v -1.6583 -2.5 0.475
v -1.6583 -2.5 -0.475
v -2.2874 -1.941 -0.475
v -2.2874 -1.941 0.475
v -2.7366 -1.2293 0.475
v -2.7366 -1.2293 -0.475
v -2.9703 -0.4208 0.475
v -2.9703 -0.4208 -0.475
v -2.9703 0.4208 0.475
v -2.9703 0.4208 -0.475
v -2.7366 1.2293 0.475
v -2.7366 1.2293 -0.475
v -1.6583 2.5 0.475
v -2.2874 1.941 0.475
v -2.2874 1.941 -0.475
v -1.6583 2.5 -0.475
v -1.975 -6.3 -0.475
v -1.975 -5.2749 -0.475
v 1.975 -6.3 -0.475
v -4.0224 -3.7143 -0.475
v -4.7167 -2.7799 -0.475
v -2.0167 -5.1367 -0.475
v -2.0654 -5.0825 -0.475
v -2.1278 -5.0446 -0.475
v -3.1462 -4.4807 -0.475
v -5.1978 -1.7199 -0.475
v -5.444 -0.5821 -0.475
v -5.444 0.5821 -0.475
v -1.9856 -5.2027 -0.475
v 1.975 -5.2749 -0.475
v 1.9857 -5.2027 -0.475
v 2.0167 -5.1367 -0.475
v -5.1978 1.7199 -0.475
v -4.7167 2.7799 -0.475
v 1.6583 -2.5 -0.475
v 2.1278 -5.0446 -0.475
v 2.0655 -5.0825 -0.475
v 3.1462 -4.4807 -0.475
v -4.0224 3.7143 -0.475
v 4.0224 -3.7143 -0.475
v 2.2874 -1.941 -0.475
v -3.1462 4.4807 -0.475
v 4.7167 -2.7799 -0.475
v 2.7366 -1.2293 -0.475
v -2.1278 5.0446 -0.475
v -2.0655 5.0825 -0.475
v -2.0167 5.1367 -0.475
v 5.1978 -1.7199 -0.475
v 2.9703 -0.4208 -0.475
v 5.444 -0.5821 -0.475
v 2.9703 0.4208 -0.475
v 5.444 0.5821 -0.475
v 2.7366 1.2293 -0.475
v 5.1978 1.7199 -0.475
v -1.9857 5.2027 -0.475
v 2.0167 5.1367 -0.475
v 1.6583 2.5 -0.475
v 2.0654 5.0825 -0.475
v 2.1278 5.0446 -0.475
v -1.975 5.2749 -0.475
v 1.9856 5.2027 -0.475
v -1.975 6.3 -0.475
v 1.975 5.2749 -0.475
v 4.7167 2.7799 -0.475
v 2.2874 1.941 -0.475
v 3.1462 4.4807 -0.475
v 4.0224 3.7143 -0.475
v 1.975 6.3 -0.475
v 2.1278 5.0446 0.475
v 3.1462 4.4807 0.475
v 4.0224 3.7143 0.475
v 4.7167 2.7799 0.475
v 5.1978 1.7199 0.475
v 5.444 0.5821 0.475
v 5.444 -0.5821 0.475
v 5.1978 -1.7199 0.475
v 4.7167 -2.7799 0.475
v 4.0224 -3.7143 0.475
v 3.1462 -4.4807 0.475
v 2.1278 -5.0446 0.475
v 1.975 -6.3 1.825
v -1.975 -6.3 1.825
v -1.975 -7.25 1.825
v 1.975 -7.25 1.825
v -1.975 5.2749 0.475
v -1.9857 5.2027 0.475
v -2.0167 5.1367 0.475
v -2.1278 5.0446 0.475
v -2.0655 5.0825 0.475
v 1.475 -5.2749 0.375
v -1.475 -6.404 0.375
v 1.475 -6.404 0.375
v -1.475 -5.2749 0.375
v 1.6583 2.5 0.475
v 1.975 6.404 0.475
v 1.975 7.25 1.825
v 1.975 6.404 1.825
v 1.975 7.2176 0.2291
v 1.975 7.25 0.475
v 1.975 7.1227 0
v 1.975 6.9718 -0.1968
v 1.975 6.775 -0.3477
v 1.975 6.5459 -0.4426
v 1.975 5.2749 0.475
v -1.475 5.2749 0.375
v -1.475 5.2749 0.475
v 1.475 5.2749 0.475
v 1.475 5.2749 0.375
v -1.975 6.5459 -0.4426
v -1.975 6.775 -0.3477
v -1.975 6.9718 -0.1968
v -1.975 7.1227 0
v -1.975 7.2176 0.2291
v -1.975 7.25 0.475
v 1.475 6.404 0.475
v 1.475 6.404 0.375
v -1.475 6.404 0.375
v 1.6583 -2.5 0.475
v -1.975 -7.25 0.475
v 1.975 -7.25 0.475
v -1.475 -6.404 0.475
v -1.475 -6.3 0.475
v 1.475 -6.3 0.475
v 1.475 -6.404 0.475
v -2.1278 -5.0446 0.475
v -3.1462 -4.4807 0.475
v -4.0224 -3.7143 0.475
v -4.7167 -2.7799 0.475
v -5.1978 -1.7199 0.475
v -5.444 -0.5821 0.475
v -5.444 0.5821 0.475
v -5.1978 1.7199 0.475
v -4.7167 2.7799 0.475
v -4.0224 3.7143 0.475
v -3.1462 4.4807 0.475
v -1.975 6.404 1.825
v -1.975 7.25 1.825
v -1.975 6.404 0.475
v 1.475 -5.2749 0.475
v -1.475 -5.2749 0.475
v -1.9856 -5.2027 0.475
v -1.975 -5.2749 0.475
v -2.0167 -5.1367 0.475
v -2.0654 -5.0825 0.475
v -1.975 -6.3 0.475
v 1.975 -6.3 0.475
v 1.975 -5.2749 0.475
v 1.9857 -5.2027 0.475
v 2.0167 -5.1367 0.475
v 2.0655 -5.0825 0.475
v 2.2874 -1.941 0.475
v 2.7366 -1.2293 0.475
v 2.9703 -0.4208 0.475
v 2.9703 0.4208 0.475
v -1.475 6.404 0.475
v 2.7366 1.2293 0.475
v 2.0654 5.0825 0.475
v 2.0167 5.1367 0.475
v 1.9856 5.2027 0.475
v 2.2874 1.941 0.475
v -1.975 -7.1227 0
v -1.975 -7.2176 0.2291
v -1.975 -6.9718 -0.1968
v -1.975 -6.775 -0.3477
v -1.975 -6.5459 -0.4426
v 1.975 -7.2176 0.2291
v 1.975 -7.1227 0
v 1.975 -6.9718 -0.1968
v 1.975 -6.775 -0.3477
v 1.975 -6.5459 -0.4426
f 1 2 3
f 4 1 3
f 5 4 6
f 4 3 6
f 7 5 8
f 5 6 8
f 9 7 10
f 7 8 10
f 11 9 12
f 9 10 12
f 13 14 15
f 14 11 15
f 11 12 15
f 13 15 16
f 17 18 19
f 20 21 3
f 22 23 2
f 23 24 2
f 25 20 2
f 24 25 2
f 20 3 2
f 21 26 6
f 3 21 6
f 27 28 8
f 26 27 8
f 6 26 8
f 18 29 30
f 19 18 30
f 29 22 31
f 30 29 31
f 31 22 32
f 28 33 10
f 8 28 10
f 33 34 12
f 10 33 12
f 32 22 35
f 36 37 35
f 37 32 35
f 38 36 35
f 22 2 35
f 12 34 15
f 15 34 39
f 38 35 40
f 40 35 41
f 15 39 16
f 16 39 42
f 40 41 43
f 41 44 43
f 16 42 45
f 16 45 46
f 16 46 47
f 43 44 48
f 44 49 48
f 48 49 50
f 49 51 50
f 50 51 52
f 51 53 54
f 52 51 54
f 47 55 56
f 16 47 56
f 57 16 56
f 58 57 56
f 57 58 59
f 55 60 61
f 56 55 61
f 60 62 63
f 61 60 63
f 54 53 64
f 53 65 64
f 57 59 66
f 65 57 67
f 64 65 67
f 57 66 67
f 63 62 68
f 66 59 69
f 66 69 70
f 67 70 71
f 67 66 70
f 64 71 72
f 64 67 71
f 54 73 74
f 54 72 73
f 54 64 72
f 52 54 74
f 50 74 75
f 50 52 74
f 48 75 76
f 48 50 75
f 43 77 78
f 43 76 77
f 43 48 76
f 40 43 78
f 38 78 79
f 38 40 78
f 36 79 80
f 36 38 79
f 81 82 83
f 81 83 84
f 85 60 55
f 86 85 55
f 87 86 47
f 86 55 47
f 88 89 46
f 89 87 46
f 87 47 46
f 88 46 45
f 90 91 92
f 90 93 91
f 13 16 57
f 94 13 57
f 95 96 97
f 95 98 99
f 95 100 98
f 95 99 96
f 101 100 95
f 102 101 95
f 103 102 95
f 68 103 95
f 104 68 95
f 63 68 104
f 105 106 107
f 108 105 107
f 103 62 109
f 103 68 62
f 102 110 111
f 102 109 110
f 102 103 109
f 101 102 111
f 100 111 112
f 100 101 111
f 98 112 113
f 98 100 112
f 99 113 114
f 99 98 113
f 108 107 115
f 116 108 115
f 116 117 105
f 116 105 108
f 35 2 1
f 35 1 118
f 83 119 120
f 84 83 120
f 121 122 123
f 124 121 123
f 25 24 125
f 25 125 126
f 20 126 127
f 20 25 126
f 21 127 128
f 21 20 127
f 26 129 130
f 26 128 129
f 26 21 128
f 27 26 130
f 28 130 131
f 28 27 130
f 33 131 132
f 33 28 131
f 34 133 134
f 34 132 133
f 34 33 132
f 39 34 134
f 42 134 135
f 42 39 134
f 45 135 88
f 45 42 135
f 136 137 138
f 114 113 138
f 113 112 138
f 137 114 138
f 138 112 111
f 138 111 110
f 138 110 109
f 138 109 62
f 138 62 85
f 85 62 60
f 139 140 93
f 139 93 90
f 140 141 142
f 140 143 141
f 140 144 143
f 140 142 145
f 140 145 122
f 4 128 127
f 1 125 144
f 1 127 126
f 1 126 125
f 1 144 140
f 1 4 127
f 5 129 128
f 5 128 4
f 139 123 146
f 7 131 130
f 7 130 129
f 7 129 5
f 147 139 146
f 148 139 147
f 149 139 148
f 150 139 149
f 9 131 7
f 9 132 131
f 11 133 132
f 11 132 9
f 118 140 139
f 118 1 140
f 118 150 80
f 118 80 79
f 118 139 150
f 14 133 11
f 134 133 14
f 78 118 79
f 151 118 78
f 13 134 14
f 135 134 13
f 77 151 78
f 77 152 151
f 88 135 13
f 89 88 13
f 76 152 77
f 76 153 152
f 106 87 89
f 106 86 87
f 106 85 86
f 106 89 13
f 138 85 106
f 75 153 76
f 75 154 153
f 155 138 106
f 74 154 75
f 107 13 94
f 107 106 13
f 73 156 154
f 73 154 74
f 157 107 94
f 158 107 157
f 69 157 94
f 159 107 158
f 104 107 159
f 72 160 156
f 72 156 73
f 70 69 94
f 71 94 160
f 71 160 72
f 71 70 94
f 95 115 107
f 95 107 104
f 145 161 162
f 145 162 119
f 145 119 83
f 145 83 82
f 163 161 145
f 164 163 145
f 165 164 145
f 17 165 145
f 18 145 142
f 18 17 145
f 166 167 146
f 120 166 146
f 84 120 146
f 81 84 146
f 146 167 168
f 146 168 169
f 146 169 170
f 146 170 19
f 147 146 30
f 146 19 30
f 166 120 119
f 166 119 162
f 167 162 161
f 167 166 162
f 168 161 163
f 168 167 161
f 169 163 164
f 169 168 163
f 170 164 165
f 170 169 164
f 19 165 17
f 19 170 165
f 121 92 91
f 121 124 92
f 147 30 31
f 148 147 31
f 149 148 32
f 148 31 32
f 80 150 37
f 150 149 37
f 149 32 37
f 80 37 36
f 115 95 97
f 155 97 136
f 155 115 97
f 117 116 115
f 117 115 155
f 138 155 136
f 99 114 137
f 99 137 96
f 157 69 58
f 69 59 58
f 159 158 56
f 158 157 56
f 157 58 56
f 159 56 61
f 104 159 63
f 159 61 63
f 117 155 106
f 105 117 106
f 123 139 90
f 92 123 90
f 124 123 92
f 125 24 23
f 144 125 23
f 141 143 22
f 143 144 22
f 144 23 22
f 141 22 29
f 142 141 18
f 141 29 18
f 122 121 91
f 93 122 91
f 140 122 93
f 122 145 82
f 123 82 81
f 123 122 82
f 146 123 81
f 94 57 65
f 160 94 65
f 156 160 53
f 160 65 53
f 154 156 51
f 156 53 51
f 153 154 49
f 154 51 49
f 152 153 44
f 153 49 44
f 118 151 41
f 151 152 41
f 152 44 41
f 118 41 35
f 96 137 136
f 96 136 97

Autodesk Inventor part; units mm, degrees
ref_plane "YZ Plane" through (0, 0, 0) normal (1, 0, 0) x (0, 1, 0)
ref_plane "XZ Plane" through (0, 0, 0) normal (0, 1, 0) x (-1, 0, 0)
ref_plane "XY Plane" through (0, 0, 0) normal (0, 0, 1) x (1, 0, 0)
sketch "Szkic4" plane through (0, 0, 0) normal (0, 0, 1) x (1, 0, 0)
  line L0 (-1.6583, 2.5) -> (1.6583, 2.5)
  line L1 (-1.6583, -2.5) -> (1.6583, -2.5)
  arc A0 (-1.6583, 2.5) -> (-1.6583, -2.5) centre (0, 0) ccw
  arc A1 (1.6583, -2.5) -> (1.6583, 2.5) centre (0, 0) ccw
  line L2 (-1.975, 7.25) -> (1.975, 7.25)
  line L3 (-1.975, 7.25) -> (-1.975, 5.2749)
  line L4 (1.975, 7.25) -> (1.975, 5.2749)
  arc A2 (1.975, 5.2749) -> (2.1278, 5.0446) centre (2.225, 5.2749) ccw
  arc A3 (-2.1278, 5.0446) -> (-1.975, 5.2749) centre (-2.225, 5.2749) ccw
  line L5 (-1.975, -7.25) -> (1.975, -7.25)
  line L6 (-1.975, -7.25) -> (-1.975, -5.2749)
  line L7 (1.975, -7.25) -> (1.975, -5.2749)
  arc A4 (2.1278, -5.0446) -> (1.975, -5.2749) centre (2.225, -5.2749) ccw
  arc A5 (-1.975, -5.2749) -> (-2.1278, -5.0446) centre (-2.225, -5.2749) ccw
  arc A6 (-2.1278, 5.0446) -> (-2.1278, -5.0446) centre (0, 0) ccw
  arc A7 (2.1278, -5.0446) -> (2.1278, 5.0446) centre (0, 0) ccw
  point P0 (-1.975, 5.1064)
  point P1 (1.975, 5.1064)
  point P2 (-1.975, -5.1064)
  point P3 (1.975, -5.1064)
  dimension "d19" = 3.95
  dimension "d20" = 0.25
extrude "Wyciągnięcie proste4" add sketch "Szkic4" along normal mid plane 0.95
sketch "Szkic5" plane through (0, 0, 0.475) normal (0, 0, 1) x (1, 0, 0)
  line L0 (-1.975, 7.25) -> (1.975, 7.25)
  line L1 (1.975, 7.25) -> (1.975, 6.404)
  line L2 (1.975, 6.404) -> (-1.975, 6.404)
  line L3 (-1.975, 6.404) -> (-1.975, 7.25)
  line L4 (1.975, -7.25) -> (-1.975, -7.25)
  line L5 (-1.975, -7.25) -> (-1.975, -6.3)
  line L6 (-1.975, -6.3) -> (1.975, -6.3)
  line L7 (1.975, -6.3) -> (1.975, -7.25)
  dimension "d23" = 0.95
extrude "Wyciągnięcie proste5" add sketch "Szkic5" along normal blind 1.35
fillet "Zaokrąglenie3" radius 0.95 2 edges at (0, 7.25, -0.475) (0, -7.25, -0.475)
sketch "Szkic6" plane through (0, 0, 0.475) normal (0, 0, 1) x (1, 0, 0)
  line L0 (-1.475, 5.2749) -> (1.475, 5.2749)
  line L1 (1.475, 5.2749) -> (1.475, 6.404)
  line L2 (1.475, 6.404) -> (-1.475, 6.404)
  line L3 (-1.475, 6.404) -> (-1.475, 5.2749)
  line L4 (-1.475, -5.2749) -> (1.475, -5.2749)
  line L5 (1.475, -5.2749) -> (1.475, -6.404)
  line L6 (1.475, -6.404) -> (-1.475, -6.404)
  line L7 (-1.475, -6.404) -> (-1.475, -5.2749)
extrude "Wyciągnięcie proste6" cut sketch "Szkic6" against normal blind 0.1
properties part number "podkładka z dwoma uszami" material "Stal"
